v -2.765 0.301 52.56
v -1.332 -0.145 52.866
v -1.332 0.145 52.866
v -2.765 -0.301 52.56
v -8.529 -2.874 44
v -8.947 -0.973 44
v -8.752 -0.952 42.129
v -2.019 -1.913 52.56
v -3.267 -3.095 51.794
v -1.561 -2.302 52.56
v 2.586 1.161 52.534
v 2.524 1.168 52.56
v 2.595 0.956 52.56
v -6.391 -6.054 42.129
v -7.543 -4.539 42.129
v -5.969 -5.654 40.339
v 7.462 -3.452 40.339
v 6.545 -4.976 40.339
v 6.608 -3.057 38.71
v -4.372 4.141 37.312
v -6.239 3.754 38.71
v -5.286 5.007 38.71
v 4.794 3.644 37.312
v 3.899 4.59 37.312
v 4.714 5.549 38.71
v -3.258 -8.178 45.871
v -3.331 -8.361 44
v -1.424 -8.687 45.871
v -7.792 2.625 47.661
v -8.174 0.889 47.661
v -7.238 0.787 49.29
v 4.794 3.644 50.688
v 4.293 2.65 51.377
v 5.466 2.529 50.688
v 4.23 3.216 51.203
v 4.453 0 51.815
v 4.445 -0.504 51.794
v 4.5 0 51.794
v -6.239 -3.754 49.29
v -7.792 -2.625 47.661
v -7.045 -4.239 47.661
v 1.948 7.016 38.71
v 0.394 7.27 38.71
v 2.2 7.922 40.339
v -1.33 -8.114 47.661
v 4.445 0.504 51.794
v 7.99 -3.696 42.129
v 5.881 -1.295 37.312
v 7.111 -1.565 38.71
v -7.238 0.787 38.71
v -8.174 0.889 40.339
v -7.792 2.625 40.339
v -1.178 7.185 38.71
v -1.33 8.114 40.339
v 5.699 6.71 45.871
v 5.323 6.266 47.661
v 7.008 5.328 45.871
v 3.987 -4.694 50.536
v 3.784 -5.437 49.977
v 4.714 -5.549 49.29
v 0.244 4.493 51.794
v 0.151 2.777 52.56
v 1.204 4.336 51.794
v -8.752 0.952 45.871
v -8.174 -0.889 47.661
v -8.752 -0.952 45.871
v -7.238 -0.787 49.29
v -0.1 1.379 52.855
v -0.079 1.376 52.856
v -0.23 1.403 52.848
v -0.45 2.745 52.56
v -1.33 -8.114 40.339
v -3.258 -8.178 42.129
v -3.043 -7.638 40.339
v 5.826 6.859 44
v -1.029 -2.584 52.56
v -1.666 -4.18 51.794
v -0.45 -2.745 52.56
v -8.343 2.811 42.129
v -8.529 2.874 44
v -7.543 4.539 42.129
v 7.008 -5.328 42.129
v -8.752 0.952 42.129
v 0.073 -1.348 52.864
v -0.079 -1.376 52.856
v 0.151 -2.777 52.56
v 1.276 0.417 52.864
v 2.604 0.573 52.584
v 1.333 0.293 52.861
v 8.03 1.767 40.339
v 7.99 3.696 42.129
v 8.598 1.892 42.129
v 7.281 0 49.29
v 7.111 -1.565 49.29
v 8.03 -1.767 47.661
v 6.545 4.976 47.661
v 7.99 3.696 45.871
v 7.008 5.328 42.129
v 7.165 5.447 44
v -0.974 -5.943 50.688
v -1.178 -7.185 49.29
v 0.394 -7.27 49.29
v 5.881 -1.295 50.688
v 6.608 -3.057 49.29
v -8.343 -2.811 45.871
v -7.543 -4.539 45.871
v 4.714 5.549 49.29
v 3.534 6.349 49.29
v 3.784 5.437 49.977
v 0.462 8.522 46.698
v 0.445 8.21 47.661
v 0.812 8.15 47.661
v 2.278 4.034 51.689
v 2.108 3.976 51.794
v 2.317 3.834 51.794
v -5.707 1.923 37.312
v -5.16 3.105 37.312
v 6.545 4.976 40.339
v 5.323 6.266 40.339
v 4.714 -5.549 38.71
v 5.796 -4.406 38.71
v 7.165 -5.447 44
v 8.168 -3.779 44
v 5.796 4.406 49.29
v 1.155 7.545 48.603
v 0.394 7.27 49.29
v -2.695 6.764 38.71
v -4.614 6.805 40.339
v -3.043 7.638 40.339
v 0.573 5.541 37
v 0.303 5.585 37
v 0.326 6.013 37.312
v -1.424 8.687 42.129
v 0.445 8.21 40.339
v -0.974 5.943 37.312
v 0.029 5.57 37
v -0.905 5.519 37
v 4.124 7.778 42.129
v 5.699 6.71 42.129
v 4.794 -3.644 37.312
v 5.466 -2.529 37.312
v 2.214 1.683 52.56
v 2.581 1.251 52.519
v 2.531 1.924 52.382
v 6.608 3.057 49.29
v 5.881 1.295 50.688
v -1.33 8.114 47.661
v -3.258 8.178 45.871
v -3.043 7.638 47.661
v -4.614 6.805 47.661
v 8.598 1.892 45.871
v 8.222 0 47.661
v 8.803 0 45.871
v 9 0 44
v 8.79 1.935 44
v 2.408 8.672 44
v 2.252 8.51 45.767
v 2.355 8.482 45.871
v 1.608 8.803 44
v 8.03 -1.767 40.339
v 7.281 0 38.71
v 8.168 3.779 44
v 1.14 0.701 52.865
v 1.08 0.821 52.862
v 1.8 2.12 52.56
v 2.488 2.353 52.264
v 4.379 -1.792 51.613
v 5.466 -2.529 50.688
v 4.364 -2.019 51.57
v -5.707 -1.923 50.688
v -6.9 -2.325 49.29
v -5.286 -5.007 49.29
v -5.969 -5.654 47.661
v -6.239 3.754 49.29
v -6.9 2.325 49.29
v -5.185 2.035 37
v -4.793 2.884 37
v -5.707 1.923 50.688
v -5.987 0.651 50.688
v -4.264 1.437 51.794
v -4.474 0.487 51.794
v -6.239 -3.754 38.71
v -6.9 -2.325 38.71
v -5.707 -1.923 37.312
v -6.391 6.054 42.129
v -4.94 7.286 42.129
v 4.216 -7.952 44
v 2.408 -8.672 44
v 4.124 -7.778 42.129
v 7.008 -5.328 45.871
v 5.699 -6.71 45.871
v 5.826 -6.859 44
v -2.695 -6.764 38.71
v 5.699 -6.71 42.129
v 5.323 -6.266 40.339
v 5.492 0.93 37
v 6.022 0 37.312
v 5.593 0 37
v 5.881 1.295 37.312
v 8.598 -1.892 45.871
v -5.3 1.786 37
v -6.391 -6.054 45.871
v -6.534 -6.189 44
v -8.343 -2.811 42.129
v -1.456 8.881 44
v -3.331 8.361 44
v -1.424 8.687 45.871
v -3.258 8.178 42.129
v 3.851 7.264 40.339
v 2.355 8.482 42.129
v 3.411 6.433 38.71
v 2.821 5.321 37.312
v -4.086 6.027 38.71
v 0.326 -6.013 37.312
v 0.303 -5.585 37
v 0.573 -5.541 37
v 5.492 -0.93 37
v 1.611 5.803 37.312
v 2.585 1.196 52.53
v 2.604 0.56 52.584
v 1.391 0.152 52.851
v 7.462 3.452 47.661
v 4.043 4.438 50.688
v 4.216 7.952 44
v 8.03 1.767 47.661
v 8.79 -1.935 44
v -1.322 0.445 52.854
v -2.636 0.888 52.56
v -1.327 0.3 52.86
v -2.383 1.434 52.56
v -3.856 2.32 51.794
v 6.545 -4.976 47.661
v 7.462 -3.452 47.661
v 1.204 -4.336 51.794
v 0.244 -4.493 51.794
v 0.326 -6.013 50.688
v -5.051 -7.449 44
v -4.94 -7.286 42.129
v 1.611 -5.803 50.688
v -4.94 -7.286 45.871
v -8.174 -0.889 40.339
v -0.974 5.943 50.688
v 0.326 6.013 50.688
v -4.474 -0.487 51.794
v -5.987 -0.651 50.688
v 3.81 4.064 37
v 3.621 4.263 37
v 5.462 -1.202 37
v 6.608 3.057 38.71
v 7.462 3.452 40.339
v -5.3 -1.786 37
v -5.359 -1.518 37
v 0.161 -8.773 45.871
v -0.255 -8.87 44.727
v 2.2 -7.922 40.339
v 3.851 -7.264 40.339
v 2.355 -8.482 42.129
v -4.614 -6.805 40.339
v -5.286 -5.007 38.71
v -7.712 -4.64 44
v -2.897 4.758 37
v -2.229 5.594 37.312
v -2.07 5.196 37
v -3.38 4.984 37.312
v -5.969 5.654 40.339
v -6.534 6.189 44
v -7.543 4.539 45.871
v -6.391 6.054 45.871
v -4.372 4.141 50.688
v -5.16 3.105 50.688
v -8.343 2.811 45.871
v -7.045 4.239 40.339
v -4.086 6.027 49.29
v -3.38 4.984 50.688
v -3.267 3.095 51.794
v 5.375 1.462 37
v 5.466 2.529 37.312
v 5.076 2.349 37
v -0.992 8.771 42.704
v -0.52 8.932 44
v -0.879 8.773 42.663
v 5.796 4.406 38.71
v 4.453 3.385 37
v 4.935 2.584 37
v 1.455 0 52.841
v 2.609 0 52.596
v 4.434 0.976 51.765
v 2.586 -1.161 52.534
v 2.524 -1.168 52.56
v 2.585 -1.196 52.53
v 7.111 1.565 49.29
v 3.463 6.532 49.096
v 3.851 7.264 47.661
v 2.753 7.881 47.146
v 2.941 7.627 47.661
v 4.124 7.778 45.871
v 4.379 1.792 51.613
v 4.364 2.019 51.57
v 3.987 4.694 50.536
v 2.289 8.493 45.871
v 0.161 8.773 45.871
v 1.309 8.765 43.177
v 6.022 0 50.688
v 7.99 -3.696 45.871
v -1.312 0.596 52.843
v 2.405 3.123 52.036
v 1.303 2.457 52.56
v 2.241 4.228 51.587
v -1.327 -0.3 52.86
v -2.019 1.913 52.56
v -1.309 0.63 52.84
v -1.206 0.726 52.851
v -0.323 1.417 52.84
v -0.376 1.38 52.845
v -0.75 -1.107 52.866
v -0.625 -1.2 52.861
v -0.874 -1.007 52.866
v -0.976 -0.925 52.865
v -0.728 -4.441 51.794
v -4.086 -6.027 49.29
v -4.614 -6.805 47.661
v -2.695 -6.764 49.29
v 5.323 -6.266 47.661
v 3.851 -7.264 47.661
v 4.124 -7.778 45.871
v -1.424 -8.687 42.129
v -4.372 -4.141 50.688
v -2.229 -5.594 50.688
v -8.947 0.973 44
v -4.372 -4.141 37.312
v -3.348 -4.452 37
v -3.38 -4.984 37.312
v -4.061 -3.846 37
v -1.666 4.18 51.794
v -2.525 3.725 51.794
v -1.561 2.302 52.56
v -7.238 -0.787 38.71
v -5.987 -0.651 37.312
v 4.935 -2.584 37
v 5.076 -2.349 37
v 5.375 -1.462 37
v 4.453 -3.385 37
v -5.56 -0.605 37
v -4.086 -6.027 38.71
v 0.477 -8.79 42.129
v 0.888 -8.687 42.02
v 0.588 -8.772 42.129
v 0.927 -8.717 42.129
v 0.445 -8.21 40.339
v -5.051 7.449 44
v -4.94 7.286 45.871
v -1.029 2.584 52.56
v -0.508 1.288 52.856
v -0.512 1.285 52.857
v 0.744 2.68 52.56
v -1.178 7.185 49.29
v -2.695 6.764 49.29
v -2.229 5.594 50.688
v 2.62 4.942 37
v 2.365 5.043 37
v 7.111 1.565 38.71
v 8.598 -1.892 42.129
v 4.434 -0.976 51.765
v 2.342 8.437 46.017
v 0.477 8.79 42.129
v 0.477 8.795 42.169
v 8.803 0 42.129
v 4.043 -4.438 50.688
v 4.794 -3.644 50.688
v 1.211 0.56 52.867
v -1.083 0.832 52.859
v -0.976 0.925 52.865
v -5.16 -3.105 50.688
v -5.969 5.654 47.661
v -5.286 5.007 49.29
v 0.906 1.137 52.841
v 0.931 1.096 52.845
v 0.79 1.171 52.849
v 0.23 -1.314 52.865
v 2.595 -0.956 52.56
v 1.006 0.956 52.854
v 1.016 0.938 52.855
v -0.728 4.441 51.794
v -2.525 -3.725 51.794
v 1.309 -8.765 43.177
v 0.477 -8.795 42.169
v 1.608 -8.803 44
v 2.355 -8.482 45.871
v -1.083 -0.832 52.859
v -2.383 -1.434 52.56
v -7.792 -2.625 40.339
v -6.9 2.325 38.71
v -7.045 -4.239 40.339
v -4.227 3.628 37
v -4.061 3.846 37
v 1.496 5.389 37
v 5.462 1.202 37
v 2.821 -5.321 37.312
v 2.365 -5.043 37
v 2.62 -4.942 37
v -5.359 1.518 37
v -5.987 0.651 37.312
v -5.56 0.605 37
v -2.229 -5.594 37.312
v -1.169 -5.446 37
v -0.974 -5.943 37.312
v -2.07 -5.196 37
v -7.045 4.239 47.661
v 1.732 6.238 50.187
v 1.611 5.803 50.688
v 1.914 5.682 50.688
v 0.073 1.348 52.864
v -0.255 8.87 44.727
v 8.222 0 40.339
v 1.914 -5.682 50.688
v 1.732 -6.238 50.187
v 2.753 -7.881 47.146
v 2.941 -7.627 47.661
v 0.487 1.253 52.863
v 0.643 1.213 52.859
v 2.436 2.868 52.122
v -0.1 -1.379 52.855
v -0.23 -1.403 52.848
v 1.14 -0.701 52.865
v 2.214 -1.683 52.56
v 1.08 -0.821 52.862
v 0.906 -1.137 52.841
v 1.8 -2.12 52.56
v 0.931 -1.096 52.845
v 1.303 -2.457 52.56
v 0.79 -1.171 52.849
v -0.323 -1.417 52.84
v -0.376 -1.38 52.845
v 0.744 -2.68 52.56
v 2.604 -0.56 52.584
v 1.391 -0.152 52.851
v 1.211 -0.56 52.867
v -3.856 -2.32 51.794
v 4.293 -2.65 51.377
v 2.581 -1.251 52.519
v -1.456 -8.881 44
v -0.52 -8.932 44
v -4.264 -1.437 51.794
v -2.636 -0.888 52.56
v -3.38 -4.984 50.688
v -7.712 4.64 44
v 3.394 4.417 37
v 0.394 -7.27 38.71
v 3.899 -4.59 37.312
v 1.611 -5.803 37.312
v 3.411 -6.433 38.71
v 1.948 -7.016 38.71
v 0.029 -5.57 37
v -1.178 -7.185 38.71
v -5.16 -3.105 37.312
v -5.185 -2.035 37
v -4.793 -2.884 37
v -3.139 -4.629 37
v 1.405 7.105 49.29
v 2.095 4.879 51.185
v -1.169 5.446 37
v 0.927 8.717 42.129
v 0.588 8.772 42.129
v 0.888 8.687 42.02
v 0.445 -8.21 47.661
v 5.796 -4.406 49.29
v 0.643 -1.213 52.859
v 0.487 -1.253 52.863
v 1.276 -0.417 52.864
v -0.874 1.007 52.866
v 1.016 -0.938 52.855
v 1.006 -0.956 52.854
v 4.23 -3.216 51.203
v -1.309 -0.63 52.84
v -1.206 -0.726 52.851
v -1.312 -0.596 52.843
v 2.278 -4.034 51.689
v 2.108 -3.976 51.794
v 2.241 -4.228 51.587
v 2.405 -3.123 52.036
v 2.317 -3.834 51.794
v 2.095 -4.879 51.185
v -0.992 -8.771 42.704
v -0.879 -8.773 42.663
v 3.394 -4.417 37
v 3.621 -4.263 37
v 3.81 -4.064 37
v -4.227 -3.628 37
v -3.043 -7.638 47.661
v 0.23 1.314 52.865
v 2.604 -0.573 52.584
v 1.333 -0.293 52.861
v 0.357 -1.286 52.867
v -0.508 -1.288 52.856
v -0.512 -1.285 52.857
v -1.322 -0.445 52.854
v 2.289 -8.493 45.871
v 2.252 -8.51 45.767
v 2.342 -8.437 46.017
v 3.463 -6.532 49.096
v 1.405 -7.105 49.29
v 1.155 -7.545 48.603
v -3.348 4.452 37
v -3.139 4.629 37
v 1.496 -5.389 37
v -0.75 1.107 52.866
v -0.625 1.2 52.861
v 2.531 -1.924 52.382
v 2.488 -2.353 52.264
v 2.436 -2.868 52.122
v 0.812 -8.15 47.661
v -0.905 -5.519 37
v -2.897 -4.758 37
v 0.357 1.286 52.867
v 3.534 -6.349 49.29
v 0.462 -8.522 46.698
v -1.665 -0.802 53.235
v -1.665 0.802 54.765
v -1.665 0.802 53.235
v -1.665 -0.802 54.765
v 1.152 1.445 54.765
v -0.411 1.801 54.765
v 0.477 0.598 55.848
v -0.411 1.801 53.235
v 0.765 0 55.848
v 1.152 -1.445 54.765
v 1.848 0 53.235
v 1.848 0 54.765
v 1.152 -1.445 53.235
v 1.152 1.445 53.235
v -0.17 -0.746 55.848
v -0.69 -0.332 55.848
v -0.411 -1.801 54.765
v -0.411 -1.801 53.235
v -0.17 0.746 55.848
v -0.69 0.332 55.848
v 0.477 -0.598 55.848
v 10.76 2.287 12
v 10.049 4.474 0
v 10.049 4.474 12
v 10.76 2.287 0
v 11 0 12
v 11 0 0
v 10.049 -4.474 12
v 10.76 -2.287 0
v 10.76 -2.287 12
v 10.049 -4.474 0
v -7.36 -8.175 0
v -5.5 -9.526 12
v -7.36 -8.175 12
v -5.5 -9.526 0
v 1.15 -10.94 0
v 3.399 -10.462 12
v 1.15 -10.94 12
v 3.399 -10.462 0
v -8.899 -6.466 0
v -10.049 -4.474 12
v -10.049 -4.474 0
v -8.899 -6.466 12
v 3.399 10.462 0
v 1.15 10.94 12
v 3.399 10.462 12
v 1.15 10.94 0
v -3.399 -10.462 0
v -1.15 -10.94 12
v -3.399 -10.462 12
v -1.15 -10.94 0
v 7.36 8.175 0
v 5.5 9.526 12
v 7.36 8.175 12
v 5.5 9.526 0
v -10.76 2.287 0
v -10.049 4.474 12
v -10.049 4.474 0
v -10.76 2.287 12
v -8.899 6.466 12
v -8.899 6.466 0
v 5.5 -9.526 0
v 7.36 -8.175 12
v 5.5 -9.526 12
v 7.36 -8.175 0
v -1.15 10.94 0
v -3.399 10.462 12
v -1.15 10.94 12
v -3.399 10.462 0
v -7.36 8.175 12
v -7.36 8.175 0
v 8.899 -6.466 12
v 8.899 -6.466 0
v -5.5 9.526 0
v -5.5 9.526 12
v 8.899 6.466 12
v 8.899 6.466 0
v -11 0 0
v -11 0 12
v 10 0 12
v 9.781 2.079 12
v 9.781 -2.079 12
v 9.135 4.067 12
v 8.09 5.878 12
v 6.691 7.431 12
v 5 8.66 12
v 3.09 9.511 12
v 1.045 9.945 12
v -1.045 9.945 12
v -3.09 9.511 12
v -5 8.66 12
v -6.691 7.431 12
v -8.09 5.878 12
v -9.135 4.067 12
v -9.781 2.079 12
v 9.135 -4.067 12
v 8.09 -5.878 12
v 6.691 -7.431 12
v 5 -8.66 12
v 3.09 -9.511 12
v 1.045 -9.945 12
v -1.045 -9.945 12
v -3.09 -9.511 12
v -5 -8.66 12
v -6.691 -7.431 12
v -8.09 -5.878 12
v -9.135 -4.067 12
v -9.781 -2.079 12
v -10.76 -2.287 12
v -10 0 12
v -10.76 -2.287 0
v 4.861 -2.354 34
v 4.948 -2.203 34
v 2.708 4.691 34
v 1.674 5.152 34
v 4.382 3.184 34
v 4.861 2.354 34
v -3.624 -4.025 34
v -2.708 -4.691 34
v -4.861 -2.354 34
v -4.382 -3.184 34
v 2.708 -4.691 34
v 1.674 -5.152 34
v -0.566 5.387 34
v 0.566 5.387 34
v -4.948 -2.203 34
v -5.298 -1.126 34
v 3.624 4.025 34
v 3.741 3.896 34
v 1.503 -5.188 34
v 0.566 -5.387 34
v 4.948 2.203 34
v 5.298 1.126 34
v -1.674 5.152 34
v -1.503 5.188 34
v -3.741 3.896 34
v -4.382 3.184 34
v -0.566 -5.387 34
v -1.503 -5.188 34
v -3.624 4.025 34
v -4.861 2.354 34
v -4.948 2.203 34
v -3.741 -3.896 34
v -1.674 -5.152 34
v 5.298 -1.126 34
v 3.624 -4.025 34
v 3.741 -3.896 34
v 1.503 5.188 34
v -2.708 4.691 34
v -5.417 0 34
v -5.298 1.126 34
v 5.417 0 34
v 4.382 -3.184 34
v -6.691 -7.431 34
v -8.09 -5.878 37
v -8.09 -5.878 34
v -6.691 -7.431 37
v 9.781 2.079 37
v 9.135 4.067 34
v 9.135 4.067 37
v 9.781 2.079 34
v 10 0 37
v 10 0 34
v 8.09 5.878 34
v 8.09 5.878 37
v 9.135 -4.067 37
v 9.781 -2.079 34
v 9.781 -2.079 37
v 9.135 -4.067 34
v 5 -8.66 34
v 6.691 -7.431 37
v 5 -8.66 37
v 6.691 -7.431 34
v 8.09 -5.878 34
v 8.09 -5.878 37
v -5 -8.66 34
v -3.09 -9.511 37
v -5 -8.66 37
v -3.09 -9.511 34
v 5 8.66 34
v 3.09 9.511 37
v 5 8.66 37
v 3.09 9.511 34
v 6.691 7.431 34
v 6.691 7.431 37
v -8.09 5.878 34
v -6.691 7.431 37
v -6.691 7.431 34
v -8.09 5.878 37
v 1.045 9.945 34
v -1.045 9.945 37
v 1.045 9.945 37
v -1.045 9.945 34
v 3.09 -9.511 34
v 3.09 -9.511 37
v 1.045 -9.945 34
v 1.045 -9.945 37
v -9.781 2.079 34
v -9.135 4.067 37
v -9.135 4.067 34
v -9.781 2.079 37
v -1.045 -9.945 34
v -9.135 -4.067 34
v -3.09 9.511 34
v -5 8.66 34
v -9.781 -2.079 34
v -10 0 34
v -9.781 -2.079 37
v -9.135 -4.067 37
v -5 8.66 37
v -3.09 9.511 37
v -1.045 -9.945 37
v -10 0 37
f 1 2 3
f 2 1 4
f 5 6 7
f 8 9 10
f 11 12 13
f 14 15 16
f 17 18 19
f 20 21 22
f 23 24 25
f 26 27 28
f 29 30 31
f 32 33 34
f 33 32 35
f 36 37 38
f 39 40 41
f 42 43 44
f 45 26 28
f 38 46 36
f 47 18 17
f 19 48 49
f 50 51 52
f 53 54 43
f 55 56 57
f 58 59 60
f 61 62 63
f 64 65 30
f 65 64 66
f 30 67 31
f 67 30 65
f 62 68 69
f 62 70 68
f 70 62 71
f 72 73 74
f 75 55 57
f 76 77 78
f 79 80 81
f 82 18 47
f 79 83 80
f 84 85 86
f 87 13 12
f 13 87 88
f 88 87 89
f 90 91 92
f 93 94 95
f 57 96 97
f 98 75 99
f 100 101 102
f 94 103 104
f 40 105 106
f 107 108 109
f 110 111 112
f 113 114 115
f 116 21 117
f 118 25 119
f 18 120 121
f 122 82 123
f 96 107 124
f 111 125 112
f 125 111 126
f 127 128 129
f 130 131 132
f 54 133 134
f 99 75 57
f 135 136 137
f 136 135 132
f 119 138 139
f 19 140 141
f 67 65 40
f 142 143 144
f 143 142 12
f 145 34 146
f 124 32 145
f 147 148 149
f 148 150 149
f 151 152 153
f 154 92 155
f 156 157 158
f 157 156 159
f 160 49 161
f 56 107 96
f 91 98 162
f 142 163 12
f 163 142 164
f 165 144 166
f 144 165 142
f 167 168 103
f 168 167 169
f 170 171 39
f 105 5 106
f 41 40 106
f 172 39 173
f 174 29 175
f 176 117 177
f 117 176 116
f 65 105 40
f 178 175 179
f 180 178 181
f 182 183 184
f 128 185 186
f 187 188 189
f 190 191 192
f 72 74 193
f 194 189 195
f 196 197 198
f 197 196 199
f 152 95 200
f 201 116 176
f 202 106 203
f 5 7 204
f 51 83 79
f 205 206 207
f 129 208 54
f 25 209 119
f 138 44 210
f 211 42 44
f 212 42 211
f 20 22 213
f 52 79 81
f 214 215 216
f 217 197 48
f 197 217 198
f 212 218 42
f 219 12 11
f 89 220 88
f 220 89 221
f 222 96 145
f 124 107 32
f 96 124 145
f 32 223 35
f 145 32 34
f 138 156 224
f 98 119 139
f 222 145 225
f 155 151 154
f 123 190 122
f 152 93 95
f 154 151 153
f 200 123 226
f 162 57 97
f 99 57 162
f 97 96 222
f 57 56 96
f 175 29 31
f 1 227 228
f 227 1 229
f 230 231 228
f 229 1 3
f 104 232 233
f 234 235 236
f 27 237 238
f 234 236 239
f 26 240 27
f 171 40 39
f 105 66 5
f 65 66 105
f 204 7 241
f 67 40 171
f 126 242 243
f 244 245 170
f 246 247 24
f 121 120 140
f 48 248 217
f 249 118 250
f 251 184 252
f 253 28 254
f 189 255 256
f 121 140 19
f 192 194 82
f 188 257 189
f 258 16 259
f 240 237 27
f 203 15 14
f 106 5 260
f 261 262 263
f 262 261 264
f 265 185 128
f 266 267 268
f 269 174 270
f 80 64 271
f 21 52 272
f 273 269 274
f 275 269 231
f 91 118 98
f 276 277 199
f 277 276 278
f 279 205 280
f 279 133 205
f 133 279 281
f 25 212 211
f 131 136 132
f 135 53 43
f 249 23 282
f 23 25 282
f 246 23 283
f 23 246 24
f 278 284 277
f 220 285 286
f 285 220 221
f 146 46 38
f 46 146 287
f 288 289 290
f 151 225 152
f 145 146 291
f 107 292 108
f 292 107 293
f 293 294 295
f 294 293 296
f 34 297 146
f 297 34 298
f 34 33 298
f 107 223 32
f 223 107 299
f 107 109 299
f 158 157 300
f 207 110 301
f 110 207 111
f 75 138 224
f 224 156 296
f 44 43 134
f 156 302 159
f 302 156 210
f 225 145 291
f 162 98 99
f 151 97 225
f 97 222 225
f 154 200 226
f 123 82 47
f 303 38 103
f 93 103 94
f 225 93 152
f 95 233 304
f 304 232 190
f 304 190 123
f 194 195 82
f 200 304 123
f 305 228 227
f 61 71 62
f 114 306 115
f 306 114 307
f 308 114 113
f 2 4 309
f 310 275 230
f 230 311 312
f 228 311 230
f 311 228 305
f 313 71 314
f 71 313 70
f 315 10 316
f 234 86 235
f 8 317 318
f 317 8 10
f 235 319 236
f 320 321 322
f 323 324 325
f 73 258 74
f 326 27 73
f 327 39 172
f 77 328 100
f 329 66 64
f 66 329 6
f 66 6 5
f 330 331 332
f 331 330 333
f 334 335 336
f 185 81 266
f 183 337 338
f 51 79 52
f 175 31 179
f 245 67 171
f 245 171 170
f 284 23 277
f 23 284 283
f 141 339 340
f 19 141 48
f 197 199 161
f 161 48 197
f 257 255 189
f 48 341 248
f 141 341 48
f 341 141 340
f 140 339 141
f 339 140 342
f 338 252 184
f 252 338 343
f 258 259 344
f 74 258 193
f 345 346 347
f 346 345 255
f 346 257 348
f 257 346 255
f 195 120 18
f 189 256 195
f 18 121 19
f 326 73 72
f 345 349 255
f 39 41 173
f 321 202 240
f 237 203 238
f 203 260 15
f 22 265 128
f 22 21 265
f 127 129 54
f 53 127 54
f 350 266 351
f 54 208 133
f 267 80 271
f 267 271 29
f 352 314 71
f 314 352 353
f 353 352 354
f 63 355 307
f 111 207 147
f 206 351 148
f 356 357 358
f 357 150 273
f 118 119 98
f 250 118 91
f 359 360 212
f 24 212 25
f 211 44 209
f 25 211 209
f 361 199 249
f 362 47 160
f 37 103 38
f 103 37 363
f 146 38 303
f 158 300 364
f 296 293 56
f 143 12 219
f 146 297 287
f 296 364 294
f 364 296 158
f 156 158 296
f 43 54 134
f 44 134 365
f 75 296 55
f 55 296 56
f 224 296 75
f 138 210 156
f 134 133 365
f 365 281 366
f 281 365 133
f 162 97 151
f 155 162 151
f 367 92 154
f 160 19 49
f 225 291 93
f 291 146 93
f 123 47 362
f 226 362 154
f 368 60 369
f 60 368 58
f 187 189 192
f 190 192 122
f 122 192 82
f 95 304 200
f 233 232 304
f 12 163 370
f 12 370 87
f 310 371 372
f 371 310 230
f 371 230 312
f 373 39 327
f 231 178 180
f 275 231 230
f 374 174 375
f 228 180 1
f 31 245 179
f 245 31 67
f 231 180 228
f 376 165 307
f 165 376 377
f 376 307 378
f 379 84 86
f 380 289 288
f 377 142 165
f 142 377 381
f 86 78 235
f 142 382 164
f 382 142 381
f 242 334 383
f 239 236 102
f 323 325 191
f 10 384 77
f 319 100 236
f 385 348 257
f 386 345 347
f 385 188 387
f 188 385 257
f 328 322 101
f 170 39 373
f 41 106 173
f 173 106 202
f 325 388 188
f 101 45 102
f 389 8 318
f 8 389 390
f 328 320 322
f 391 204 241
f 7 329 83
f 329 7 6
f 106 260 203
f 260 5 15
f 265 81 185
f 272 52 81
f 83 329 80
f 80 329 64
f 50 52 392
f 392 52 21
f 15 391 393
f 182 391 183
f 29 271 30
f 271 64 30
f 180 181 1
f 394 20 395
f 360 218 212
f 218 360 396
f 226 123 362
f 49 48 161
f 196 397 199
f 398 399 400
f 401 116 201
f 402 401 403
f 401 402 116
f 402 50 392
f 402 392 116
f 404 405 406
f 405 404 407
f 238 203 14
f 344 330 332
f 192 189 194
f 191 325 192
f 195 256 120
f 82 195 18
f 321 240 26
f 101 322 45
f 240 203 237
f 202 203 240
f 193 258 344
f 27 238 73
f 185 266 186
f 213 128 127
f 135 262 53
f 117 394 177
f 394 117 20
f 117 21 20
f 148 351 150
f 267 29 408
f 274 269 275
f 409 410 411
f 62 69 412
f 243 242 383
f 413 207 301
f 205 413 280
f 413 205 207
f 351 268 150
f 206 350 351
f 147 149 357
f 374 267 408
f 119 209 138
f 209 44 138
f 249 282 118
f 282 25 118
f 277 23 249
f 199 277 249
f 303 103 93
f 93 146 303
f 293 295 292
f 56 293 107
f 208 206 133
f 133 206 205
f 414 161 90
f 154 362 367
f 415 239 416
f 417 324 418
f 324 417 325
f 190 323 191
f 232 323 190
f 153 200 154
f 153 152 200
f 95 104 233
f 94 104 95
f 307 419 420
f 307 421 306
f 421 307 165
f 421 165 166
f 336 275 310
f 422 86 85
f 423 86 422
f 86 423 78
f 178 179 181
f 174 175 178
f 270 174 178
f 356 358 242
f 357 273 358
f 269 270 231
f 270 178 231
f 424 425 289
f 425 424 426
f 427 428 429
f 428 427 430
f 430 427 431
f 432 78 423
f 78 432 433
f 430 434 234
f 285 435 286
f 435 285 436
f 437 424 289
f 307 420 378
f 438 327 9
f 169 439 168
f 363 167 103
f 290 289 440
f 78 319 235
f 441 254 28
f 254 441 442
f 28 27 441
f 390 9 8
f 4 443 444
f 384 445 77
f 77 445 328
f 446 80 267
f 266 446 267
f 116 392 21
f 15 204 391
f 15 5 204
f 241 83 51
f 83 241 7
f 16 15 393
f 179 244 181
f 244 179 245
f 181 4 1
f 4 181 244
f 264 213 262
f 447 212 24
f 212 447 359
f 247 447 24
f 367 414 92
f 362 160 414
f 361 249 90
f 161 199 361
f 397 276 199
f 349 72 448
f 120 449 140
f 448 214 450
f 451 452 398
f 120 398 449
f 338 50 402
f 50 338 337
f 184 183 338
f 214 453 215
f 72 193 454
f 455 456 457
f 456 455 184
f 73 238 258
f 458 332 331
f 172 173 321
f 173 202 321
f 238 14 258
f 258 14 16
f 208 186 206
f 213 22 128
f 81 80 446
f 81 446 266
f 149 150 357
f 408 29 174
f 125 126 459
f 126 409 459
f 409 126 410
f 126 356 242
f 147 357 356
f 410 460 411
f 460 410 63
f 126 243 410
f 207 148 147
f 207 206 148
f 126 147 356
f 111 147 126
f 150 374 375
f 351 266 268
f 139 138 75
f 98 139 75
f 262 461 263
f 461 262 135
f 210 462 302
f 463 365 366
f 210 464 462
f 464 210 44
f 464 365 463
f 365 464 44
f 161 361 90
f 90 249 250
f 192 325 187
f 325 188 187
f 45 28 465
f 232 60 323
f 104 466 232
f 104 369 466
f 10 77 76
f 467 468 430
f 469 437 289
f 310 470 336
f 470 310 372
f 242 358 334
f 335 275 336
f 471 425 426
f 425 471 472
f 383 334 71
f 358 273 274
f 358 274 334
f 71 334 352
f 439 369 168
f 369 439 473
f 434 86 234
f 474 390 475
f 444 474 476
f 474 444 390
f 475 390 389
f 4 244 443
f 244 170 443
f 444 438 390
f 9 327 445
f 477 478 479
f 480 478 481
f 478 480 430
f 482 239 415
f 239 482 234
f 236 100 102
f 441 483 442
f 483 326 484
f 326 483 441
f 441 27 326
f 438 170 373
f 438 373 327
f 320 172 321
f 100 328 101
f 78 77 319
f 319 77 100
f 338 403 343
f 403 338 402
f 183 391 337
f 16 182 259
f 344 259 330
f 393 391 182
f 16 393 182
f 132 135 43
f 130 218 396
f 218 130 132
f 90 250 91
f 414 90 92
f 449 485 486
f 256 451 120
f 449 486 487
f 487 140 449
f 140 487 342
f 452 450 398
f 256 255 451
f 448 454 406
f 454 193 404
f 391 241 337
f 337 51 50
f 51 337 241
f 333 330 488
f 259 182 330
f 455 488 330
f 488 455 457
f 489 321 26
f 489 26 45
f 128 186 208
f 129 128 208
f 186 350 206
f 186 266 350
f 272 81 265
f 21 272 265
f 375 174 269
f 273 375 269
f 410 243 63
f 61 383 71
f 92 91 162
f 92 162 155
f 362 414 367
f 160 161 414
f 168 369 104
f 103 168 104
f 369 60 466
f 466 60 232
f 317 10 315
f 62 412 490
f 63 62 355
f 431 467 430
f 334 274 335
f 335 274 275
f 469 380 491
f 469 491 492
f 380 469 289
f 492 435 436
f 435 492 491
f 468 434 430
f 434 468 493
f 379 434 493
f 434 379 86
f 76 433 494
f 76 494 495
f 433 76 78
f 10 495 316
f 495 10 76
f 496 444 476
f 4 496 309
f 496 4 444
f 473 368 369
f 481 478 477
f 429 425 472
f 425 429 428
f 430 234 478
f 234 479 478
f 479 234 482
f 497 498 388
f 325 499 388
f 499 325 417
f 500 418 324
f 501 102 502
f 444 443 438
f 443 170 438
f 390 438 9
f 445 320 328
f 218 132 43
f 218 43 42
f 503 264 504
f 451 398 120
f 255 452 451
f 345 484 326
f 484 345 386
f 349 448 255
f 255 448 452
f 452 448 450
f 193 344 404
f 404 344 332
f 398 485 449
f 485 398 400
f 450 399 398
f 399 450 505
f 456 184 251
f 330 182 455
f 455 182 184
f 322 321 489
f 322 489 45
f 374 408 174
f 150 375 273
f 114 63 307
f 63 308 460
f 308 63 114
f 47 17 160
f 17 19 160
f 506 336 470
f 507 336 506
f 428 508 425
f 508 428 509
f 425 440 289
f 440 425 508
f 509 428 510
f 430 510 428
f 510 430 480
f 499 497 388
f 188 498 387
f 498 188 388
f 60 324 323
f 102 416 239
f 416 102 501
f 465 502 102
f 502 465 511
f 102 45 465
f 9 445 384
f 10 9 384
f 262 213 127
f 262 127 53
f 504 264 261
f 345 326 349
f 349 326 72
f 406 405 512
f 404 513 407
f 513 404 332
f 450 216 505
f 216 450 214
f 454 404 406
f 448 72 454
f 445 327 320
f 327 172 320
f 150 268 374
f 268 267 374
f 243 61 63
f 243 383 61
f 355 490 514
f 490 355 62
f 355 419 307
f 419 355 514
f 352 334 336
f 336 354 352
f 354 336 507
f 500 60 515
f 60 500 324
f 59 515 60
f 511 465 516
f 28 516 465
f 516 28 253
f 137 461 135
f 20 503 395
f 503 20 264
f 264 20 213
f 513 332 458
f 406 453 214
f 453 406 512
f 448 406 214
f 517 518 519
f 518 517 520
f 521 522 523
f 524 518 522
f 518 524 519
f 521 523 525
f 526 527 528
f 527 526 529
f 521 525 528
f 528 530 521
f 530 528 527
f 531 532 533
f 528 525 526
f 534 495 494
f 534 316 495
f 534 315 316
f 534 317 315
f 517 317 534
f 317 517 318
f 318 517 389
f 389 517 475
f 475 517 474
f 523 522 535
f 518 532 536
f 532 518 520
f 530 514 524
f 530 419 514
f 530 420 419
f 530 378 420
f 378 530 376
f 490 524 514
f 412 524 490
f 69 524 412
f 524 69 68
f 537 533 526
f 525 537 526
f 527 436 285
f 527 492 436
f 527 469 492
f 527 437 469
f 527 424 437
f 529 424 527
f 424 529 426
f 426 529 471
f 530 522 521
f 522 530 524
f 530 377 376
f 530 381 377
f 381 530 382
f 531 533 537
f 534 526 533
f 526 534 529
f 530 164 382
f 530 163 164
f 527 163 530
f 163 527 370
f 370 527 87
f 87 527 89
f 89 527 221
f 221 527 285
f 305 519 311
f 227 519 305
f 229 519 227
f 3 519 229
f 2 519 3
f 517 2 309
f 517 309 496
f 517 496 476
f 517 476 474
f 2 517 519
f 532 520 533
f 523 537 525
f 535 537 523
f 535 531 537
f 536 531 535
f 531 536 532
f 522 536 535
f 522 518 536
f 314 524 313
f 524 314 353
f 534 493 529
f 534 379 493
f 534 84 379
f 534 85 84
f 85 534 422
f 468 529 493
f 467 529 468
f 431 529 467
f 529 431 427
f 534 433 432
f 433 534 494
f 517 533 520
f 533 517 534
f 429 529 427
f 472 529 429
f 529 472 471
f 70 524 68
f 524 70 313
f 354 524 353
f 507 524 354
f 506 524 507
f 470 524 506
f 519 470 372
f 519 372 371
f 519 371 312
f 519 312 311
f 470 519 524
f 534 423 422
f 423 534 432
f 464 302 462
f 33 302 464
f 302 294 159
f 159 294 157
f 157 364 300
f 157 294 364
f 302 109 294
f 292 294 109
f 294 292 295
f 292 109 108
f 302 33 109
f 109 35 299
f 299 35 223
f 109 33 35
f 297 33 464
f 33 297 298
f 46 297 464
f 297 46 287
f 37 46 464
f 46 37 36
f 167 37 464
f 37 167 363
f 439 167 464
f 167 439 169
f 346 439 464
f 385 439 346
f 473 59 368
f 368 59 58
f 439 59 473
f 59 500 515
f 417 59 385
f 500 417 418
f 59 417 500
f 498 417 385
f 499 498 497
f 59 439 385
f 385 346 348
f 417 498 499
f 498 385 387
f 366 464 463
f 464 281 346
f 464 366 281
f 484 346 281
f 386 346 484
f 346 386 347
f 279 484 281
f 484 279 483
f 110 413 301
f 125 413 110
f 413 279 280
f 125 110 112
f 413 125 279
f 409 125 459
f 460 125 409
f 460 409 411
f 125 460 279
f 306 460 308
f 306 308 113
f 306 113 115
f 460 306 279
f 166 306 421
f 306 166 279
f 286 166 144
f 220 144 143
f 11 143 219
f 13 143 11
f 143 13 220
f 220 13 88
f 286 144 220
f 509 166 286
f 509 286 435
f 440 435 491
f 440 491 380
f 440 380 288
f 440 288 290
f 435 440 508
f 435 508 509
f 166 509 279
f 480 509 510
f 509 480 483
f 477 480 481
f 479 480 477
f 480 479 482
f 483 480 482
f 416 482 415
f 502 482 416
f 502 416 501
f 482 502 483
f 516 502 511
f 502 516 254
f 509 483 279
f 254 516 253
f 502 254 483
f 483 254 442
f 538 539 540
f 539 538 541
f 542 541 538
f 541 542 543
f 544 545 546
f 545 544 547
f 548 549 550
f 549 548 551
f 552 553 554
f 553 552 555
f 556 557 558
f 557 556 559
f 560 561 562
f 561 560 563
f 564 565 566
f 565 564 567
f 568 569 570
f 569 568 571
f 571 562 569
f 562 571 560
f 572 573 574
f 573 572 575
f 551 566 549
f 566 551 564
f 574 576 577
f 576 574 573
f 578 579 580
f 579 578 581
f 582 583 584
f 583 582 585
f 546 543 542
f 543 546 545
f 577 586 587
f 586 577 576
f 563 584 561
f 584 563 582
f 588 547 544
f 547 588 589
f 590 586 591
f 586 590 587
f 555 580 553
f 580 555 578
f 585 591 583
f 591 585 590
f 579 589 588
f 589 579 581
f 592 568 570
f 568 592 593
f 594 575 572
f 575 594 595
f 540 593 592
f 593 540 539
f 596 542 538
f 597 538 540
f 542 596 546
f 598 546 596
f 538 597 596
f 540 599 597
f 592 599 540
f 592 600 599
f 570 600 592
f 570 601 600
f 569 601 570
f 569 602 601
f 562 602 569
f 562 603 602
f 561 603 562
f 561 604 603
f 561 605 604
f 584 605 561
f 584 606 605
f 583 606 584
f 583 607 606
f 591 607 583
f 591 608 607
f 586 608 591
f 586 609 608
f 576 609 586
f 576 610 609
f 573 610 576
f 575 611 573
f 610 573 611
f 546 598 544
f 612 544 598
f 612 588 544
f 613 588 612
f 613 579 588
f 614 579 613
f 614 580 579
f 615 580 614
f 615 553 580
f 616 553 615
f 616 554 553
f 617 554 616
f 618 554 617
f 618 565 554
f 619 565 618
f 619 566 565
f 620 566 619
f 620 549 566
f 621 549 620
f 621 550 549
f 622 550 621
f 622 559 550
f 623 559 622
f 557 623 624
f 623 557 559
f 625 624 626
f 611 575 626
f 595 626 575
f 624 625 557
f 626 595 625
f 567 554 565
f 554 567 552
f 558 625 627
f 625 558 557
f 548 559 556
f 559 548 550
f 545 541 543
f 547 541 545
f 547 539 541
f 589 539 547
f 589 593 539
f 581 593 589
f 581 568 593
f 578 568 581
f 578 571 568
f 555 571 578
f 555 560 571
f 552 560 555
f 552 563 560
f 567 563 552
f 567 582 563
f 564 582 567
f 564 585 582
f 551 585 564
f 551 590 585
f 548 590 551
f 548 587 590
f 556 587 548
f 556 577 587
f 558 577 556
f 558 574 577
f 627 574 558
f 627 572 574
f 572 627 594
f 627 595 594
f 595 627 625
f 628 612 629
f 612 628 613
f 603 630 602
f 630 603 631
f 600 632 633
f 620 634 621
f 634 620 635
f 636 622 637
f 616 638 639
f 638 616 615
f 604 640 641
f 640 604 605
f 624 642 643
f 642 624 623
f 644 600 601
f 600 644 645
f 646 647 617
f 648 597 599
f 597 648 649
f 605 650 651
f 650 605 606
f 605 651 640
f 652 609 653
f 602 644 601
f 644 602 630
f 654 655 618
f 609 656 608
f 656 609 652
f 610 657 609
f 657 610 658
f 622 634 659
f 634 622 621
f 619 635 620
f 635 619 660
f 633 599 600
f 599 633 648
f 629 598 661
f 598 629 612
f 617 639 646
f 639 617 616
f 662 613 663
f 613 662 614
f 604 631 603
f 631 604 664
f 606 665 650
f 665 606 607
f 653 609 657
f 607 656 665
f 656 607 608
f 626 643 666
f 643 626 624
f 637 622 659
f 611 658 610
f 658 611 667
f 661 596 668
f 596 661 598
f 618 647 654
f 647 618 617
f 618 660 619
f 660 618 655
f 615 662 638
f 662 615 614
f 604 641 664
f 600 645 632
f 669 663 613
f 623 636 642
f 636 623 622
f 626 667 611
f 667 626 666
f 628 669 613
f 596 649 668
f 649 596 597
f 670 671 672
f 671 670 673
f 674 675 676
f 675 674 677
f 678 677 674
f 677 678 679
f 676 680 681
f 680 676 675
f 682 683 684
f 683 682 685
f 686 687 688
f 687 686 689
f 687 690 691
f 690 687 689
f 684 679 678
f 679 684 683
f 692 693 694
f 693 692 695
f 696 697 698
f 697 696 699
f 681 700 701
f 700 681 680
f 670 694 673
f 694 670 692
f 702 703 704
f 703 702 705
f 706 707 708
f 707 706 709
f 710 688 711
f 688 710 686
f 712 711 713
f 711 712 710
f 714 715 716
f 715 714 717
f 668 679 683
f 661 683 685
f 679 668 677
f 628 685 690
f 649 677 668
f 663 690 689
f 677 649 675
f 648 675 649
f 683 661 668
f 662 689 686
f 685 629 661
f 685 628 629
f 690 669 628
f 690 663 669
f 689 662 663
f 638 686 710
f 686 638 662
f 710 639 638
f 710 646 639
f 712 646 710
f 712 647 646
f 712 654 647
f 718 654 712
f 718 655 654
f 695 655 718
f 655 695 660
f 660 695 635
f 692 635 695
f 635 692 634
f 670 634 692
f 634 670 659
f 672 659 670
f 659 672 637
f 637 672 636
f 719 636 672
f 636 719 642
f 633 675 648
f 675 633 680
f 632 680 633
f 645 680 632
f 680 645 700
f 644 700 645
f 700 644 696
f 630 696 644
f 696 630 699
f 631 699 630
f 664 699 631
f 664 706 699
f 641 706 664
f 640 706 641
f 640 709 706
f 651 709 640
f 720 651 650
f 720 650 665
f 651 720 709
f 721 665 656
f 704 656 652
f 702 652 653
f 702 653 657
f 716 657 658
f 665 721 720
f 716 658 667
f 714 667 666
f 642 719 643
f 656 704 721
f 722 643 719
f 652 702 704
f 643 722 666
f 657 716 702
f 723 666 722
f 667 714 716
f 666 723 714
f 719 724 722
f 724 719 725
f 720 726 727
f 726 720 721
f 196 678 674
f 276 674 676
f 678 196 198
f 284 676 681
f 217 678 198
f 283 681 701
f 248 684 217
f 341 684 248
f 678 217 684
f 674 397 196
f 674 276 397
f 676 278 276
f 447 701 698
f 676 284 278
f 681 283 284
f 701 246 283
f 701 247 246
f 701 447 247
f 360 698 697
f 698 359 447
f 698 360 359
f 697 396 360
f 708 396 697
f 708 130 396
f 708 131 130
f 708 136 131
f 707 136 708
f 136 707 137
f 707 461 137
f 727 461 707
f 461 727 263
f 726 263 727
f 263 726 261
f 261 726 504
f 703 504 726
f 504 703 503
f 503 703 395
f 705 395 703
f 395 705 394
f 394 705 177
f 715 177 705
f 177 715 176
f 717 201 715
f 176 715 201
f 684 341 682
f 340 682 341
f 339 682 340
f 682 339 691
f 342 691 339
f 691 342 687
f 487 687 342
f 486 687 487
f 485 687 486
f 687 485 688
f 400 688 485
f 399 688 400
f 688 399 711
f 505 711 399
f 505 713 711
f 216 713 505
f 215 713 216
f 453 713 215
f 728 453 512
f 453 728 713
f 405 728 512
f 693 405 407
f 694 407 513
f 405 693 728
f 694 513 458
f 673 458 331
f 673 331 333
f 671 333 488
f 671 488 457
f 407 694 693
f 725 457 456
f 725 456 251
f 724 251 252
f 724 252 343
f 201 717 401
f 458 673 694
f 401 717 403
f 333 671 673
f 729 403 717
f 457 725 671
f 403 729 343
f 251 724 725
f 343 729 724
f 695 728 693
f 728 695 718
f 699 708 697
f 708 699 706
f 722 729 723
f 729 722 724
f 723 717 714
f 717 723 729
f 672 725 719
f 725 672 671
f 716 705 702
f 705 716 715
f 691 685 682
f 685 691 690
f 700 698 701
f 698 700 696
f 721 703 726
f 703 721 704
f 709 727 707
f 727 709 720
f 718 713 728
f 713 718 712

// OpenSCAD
// Generated by SolidPython 1.1.1 on 2021-10-31 00:07:22


union() {
	cylinder(d = 22, h = 12);
	translate(v = [0, 0, 12]) {
		cylinder(d1 = 20, d2 = 10, h = 24);
	}
	translate(v = [0, 0, 34]) {
		cylinder(d = 20, h = 3);
	}
	translate(v = [0, 0, 44]) {
		difference() {
			union() {
				sphere(d = 18);
				translate(v = [0, 0, 10]) {
					sphere(d = 4);
				}
			}
			translate(v = [2, 0, 4]) {
				rotate(a = [0, 20, 0]) {
					cube(center = true, size = [2, 20, 12]);
				}
			}
		}
	}
}
/***********************************************
*********      SolidPython code:      **********
************************************************
 
from solid import *
from solid.utils import *

#total height 5.6cm

base = cylinder(d=22, h=12)
body = cylinder(d1=20, d2=10, h=24)
colar = cylinder(d=20, h=3)
head = sphere(d=18) + up(10)(sphere(d=4))
head -= translate([2,0,4])(
    rotate([0,20,0])(
        cube([2, 20, 12], center=True)
        )
    )

bishop = base + up(12)(body) + up(34)(colar) + up(44)(head)

scad_render_to_file(bishop, "./bishop.scad") 
 
************************************************/
